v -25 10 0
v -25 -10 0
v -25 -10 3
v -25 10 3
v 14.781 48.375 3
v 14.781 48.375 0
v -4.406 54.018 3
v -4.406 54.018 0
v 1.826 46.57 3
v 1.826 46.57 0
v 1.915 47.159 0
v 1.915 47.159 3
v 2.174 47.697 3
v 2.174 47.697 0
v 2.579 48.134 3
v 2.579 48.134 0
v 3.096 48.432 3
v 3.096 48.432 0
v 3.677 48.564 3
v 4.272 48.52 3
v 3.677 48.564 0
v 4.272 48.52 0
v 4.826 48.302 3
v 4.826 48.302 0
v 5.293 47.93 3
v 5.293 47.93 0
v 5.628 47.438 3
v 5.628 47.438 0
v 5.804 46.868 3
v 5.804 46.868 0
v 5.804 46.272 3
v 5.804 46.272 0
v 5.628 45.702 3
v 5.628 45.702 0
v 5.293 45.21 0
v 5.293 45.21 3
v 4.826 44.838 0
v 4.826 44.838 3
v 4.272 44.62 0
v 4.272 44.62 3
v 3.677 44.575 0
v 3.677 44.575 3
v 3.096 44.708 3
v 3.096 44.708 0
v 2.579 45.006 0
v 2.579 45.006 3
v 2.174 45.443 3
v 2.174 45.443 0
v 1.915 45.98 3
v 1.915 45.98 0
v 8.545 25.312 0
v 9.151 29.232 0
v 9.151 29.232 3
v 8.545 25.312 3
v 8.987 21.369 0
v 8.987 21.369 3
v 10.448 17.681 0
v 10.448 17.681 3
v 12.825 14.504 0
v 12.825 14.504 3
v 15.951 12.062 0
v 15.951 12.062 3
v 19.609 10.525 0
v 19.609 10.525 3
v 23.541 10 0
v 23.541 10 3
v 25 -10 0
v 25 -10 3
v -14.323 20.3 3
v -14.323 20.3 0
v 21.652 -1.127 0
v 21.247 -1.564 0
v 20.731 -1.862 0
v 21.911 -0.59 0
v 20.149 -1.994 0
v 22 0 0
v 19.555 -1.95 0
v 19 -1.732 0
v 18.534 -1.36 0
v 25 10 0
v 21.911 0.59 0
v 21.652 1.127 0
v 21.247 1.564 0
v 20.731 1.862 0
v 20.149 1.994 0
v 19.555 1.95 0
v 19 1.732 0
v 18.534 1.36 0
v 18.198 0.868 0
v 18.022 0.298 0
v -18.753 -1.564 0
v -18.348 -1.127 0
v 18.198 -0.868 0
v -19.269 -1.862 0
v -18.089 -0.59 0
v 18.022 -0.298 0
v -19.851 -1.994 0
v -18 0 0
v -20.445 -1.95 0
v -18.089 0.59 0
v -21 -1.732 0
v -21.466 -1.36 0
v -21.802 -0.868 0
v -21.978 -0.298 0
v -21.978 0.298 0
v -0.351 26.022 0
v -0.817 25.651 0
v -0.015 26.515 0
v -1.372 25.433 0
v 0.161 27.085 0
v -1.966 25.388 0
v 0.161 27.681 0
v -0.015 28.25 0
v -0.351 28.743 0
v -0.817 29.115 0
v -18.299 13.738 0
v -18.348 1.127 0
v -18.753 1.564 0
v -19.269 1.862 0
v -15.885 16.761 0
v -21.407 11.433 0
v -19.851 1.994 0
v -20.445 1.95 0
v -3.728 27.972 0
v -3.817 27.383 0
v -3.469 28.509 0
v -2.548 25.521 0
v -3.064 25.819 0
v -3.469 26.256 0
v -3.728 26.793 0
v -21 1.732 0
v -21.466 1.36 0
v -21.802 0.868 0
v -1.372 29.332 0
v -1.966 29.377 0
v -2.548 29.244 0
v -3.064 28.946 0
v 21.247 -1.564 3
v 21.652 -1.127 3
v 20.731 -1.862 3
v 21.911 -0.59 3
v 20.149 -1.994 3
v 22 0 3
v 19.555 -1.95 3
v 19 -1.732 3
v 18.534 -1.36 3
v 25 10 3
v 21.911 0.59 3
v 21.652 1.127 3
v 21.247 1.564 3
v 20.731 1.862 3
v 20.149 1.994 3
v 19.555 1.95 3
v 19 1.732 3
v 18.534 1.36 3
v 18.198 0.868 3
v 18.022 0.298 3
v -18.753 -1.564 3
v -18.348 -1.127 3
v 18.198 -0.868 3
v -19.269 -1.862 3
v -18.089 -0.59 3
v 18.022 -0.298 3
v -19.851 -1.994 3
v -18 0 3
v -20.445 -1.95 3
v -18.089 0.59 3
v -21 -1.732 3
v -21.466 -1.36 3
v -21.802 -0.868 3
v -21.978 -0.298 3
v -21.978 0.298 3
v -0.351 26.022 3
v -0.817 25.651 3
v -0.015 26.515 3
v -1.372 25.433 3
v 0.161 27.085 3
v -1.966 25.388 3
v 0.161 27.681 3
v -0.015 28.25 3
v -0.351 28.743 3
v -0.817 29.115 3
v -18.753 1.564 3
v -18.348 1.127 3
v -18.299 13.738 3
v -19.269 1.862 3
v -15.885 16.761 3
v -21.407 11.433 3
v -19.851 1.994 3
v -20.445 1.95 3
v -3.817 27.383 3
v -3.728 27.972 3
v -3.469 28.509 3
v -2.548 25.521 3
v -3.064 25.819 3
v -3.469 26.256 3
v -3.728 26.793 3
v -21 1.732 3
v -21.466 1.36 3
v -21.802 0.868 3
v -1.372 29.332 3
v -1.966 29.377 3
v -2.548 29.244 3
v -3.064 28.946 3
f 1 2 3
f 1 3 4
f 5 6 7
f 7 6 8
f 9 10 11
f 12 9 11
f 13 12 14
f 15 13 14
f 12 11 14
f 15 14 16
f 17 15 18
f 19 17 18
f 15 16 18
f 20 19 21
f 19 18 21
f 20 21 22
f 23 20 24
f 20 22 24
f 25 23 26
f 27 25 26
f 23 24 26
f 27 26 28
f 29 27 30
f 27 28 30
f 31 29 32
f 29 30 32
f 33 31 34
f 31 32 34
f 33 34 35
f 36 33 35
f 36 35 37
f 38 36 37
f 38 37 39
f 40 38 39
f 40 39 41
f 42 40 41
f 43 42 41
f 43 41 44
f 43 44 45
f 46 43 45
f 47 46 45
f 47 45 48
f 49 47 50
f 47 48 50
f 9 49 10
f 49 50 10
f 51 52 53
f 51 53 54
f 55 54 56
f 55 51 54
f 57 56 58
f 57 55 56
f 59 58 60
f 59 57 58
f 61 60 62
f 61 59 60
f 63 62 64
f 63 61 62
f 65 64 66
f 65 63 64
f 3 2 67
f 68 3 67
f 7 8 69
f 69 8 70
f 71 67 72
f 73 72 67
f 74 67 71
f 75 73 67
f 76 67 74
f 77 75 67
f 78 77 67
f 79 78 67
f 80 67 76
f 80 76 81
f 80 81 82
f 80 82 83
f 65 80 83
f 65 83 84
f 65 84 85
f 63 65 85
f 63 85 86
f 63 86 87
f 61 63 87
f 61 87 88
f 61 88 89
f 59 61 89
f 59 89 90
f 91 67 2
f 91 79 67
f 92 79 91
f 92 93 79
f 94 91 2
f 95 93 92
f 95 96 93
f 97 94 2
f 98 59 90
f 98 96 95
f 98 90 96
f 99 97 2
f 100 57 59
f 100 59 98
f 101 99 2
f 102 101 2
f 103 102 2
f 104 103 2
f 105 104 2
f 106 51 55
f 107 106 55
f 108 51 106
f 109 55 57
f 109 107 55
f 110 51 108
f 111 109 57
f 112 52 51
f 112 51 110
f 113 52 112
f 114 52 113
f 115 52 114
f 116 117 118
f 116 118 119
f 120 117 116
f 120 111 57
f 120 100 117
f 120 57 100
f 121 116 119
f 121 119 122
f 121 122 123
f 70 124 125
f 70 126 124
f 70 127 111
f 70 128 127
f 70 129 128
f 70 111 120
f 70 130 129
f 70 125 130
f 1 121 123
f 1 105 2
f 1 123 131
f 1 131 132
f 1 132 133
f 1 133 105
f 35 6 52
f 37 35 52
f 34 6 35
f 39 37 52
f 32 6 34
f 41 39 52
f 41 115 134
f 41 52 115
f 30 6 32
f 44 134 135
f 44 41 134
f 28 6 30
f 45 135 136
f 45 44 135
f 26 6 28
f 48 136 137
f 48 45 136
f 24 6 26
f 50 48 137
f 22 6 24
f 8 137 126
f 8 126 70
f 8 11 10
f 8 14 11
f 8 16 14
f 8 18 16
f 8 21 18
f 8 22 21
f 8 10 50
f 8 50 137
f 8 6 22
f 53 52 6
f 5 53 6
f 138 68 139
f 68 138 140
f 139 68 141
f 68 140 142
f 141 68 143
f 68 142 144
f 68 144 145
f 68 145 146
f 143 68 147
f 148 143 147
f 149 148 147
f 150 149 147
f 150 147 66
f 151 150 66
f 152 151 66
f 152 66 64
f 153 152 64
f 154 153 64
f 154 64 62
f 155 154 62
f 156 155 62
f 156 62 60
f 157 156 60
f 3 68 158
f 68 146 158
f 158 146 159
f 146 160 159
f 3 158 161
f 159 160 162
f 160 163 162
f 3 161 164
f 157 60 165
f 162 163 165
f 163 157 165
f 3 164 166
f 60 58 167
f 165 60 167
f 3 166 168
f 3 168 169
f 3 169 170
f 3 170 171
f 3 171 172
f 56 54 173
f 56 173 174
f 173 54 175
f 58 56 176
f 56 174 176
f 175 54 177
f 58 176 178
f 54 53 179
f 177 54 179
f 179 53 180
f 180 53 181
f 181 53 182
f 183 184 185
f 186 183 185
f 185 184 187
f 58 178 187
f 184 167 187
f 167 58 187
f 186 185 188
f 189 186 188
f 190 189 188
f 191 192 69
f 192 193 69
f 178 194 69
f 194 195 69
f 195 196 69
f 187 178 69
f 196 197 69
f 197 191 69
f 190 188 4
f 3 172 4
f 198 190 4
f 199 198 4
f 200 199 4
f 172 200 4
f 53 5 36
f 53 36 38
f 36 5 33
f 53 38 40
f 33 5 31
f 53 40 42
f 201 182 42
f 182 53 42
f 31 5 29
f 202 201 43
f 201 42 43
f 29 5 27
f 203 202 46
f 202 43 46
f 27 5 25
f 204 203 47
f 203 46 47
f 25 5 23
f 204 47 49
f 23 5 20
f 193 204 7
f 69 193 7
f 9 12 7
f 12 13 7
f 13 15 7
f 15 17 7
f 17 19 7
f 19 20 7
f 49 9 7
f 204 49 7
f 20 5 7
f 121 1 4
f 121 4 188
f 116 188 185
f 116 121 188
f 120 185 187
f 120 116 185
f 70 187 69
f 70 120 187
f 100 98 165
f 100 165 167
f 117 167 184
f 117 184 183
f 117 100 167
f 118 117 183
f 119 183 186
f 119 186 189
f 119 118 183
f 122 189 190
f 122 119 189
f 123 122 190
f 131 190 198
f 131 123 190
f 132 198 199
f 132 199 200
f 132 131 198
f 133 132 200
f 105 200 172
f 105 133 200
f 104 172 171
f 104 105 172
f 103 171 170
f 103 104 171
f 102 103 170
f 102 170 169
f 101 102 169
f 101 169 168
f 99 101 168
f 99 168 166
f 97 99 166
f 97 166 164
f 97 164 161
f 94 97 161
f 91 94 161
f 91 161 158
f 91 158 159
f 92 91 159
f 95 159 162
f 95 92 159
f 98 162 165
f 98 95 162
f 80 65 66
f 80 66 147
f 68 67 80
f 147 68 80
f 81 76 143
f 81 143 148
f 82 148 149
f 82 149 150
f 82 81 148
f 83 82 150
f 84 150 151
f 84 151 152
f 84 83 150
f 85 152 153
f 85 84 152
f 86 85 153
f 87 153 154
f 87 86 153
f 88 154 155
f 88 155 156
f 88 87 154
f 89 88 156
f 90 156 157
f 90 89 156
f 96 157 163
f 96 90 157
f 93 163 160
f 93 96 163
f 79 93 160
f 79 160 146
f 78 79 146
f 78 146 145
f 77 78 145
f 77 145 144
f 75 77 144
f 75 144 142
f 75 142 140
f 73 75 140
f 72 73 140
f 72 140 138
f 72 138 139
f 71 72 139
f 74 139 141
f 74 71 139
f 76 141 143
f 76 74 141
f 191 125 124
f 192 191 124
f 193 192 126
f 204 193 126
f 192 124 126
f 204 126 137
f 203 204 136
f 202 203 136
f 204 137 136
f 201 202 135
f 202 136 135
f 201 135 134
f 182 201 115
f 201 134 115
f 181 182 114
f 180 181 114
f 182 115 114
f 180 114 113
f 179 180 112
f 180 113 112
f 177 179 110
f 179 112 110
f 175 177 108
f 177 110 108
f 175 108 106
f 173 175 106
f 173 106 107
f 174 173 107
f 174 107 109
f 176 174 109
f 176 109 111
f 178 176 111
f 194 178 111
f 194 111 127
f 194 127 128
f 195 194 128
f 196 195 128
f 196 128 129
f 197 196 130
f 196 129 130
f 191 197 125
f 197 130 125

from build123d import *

# Parameters (mm, degrees)
SKETCH_1_W      = 50
SKETCH_1_H      = 20
SKETCH_1_R      = 2
EXTRUDE_1_DEPTH = 3
SKETCH_2_R      = 2
EXTRUDE_2_DEPTH = 3
FILLET_1_R      = 15


with BuildPart() as part:
    # 草图1 → 凸台-拉伸1 (new body)
    with BuildSketch(Plane.XY):
        Rectangle(SKETCH_1_W, SKETCH_1_H)
        with Locations((20, 0)):
            Circle(SKETCH_1_R, mode=Mode.SUBTRACT)
        with Locations((-20, 0)):
            Circle(SKETCH_1_R, mode=Mode.SUBTRACT)
    extrude(amount=EXTRUDE_1_DEPTH)

    # 草图2 → 凸台-拉伸2 (add)
    with BuildSketch(Plane(origin=(0, 0, 0), x_dir=(-1, 0, 0), z_dir=(0, 0, -1))):
        Polygon((-3.494170761, 10), (-14.78082372, 48.374620063), (4.406486311, 54.017946543), (17.352941176, 10), align=None)
        with Locations((-3.826468347, 46.569902088)):
            Circle(SKETCH_2_R, mode=Mode.SUBTRACT)
        with Locations((1.816858133, 27.382592056)):
            Circle(SKETCH_2_R, mode=Mode.SUBTRACT)
    extrude(amount=-EXTRUDE_2_DEPTH)

    # 圆角1
    # the kernel refuses this fillet: 15 mm, written as the material it adds along each edge
    with BuildSketch(Plane(origin=(-17.352941176, 10, 0), x_dir=(-1, 0, 0), z_dir=(0, 0, 1))) as fillet_1_piece_1:
        with BuildLine():
            CenterArc((11.360931708, -14.532967632), FILLET_1_R, 104.335036725, 59.275422941)
            Line((-3.029550815, -10.300472772), (-3.317360466, -10.215822875))
            Line((-3.317360466, -10.215822875), (-0.28780965, 0.084649897))
            Line((-0.28780965, 0.084649897), (0, 0.3))
            ThreePointArc((0, 0.3), (3.823529412, 0.3), (7.572781366, 0.290659353))
            Line((7.572781366, 0.290659353), (7.647058824, 0))
        make_face()
    extrude(amount=3)
    with BuildSketch(Plane(origin=(3.494170761, 10, 0), x_dir=(1, 0, 0), z_dir=(0, 0, 1))) as fillet_1_piece_2:
        with BuildLine():
            CenterArc((FILLET_1_R * 1.33647324392, FILLET_1_R), FILLET_1_R, 163.610459666, 106.389540334)
            Line((FILLET_1_R * 0.37710774235, FILLET_1_R * 1.28216632399), (FILLET_1_R * 0.357920432319, FILLET_1_R * 1.28780965047))
            Line((FILLET_1_R * 0.357920432319, FILLET_1_R * 1.28780965047), (-FILLET_1_R * 0.0267294648784, -FILLET_1_R * 0.02))
            Line((-FILLET_1_R * 0.0267294648784, -FILLET_1_R * 0.02), (FILLET_1_R * 1.33647324392, -FILLET_1_R * 0.02))
            Line((FILLET_1_R * 1.33647324392, -FILLET_1_R * 0.02), (FILLET_1_R * 1.33647324392, 0))
        make_face()
    extrude(amount=3)


solid = part.part
